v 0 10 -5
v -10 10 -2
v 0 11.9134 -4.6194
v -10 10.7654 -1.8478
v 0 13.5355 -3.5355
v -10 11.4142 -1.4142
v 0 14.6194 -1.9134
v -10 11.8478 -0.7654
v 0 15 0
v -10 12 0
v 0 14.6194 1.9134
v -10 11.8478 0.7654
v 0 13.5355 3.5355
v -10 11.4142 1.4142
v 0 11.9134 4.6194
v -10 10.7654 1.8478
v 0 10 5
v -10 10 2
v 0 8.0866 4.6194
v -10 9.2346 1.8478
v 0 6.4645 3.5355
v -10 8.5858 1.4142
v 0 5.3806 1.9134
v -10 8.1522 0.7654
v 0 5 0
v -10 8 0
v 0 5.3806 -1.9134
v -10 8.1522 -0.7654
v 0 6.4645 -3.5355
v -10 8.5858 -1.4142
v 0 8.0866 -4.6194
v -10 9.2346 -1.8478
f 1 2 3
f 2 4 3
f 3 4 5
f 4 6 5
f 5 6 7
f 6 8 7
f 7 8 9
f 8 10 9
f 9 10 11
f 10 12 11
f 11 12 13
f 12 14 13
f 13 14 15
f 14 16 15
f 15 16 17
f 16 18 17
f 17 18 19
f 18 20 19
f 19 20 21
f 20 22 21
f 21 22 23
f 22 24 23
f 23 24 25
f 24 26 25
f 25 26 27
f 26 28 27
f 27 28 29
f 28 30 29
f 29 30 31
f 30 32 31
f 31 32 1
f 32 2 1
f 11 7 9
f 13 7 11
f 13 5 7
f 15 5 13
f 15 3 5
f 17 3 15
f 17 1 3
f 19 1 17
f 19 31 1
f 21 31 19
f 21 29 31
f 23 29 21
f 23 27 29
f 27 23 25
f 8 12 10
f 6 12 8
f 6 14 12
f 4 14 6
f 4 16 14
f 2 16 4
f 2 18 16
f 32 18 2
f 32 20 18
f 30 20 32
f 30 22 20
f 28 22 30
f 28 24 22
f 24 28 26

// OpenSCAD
mirror([10, 0, 0]) translate([0,10,0])
  rotate([0,90,0]) 
    cylinder(h=10, r1=5, r2=2);
%translate([0,10,0]) 
  rotate([0,90,0]) 
    cylinder(h=10, r1=5, r2=2);
